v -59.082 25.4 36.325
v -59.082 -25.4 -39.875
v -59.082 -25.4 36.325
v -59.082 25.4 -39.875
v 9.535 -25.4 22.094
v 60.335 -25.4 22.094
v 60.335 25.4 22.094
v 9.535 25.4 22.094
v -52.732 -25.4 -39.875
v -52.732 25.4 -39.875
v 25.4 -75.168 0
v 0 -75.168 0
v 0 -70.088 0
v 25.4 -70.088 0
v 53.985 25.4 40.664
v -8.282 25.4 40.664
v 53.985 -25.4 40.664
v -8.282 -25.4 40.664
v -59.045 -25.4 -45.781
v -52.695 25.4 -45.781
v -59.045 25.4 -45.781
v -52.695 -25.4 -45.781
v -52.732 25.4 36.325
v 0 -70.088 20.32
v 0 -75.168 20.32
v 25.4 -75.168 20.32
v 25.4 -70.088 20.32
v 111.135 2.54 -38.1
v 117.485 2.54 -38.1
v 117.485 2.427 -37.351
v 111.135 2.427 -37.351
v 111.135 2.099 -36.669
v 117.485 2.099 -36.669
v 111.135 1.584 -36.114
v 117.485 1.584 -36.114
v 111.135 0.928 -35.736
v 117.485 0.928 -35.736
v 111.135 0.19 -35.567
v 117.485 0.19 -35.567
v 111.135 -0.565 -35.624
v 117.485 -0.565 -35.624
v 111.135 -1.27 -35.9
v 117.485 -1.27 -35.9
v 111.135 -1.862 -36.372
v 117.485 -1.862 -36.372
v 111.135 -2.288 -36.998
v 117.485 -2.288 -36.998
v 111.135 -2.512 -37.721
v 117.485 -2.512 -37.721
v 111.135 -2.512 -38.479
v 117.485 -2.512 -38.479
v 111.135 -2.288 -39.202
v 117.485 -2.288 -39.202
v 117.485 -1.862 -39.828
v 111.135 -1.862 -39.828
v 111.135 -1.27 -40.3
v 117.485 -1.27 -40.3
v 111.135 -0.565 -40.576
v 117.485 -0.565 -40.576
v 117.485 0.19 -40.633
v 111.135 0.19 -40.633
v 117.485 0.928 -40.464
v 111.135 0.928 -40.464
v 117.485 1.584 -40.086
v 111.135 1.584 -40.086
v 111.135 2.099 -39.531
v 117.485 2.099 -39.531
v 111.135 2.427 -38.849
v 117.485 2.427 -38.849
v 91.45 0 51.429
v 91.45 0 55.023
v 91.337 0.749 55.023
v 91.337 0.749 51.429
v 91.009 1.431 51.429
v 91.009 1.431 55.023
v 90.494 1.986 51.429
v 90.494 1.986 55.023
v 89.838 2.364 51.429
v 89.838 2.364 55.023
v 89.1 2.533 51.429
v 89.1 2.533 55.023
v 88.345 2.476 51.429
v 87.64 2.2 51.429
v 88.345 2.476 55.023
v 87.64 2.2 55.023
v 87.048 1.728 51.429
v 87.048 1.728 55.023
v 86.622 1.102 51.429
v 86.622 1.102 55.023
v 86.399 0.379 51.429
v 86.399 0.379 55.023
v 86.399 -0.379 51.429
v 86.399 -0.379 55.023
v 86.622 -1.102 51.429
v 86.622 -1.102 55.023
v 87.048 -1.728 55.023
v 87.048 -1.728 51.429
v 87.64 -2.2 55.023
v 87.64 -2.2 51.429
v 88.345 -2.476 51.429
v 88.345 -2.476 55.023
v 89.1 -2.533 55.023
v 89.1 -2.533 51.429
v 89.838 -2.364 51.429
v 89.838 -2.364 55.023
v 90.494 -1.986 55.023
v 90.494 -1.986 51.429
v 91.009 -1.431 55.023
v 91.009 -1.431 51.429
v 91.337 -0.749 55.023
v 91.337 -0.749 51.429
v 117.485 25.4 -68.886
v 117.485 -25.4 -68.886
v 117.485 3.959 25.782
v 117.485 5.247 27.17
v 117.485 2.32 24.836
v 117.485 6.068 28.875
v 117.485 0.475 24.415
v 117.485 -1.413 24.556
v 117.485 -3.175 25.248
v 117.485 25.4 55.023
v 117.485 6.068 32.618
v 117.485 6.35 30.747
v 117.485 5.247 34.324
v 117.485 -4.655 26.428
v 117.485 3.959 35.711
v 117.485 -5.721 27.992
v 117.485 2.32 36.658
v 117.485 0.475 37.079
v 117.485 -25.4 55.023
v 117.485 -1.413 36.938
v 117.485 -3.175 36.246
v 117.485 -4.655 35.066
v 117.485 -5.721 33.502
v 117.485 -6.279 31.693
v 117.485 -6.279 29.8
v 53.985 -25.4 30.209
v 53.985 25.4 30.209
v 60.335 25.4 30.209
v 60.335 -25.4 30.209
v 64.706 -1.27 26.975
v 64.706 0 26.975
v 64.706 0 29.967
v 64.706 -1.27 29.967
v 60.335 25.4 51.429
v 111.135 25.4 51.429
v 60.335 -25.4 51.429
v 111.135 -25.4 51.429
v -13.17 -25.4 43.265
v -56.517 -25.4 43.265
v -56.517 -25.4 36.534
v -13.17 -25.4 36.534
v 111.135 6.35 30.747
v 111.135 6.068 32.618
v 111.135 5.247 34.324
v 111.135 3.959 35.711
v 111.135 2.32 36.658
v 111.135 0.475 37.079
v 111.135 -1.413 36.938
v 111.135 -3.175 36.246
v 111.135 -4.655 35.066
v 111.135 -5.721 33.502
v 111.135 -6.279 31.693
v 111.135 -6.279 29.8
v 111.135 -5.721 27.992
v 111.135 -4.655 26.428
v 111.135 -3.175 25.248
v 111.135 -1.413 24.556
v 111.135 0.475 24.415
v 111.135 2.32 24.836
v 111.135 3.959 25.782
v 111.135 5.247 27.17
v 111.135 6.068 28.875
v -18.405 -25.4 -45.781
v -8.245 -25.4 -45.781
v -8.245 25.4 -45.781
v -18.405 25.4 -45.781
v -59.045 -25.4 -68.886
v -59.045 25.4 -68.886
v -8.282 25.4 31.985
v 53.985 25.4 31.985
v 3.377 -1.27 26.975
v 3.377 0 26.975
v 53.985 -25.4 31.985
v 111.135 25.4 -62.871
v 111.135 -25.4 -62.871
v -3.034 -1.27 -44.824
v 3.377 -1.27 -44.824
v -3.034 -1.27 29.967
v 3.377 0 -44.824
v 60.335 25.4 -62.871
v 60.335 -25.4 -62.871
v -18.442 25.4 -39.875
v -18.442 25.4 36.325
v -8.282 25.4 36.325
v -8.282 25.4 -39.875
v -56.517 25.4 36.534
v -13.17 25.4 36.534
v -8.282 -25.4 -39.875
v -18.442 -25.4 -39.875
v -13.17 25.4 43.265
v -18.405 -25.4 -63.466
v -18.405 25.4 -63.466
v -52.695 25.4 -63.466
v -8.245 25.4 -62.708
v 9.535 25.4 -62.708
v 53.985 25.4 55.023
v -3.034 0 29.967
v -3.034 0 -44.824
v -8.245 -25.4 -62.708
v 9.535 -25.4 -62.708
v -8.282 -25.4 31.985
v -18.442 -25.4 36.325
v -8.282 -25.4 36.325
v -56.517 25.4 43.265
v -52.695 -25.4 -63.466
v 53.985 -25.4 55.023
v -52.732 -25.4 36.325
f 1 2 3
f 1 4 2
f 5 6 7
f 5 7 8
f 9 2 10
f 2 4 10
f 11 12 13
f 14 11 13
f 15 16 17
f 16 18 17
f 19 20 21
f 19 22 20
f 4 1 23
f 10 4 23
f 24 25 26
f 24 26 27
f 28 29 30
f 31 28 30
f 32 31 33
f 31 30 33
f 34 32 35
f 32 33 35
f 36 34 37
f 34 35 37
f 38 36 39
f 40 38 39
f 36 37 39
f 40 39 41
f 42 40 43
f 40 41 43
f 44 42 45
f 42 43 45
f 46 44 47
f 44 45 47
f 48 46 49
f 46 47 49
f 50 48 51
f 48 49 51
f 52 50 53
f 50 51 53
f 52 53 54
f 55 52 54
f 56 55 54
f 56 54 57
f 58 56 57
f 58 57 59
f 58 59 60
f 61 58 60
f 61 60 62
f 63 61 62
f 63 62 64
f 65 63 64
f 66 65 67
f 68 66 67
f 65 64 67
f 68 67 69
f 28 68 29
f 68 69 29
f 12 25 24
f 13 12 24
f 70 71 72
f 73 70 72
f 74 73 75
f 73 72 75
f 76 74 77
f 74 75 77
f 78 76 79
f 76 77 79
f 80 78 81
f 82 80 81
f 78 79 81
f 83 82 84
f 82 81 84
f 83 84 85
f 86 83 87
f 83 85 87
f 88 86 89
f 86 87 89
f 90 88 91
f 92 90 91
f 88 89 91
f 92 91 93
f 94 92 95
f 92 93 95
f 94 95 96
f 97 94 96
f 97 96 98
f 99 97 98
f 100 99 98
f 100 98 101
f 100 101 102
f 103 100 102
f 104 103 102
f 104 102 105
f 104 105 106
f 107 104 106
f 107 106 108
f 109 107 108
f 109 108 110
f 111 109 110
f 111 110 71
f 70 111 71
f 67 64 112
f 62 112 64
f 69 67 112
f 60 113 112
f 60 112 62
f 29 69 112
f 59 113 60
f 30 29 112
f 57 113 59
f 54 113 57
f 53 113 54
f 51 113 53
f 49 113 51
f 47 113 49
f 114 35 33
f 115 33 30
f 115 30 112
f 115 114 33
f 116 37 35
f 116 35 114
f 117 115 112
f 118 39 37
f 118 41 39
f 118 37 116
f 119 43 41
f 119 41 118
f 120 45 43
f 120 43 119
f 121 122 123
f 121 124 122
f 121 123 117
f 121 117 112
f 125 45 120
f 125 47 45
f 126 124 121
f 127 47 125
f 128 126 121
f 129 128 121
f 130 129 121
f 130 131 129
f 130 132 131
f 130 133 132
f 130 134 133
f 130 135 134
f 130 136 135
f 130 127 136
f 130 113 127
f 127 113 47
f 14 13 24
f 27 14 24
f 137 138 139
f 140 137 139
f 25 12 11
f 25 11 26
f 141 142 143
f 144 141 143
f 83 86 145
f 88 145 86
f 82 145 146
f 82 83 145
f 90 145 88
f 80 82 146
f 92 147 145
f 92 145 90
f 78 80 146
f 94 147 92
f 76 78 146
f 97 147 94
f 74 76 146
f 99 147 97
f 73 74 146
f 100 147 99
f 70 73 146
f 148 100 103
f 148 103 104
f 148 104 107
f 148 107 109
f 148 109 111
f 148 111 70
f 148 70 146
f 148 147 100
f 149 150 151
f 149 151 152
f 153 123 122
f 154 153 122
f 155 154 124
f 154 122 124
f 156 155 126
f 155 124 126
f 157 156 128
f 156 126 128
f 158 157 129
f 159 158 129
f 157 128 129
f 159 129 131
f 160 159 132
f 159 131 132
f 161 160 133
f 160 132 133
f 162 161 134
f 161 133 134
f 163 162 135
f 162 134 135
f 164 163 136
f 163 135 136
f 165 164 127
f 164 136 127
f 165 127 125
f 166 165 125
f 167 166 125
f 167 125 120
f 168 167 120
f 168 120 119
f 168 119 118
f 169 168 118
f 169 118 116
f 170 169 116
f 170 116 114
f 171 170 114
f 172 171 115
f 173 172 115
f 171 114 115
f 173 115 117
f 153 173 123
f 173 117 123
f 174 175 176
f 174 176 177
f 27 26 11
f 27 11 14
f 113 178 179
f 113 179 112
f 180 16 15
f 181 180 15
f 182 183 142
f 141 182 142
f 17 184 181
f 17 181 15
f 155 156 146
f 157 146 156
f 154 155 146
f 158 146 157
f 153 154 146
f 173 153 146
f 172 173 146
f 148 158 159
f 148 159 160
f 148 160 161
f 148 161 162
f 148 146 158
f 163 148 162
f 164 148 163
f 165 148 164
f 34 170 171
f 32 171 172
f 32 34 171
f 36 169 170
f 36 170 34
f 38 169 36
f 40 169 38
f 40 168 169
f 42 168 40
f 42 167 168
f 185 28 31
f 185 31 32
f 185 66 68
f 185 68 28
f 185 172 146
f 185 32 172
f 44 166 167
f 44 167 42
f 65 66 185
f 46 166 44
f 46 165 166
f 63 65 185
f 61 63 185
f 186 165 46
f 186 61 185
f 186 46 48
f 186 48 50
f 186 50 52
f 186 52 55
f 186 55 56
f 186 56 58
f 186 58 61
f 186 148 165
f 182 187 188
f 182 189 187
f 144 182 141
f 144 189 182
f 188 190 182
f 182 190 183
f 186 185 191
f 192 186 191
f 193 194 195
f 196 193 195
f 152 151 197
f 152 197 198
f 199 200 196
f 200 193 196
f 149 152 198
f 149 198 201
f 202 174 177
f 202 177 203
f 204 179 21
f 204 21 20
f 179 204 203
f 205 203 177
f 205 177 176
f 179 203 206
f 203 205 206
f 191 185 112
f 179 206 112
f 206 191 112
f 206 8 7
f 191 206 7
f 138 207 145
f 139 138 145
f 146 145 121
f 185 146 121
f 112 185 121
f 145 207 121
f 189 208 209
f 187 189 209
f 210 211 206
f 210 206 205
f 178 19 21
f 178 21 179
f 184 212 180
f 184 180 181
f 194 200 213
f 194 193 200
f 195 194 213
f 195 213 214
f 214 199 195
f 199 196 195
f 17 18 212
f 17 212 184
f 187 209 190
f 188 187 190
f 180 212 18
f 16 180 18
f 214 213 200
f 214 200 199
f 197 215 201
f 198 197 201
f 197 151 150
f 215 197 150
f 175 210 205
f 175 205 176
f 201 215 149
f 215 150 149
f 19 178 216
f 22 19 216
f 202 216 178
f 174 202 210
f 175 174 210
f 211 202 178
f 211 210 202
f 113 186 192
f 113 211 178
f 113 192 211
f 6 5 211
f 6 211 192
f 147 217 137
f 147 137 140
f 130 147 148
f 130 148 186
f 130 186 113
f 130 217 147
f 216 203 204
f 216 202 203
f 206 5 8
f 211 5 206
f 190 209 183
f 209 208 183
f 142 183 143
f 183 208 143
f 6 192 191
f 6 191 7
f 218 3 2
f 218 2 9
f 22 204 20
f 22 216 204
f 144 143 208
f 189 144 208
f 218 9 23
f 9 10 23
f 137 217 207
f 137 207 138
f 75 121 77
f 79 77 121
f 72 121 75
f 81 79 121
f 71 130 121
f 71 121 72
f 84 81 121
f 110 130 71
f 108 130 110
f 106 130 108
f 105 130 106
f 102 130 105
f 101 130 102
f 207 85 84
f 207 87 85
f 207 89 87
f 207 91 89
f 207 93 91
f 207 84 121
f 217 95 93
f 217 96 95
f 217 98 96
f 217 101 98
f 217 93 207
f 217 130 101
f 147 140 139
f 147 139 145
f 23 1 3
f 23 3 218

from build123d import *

# Parameters (mm, degrees)
F0_W      = 6.35
F0_H      = 76.2
F0_W_2    = 10.16
F1_DEPTH  = 25.4
F2_R      = 6.35
F3_DEPTH  = 6.35
F4_R      = 2.54
F5_DEPTH  = 6.35
F6_R      = 2.54
F7_DEPTH  = 3.8128
F8_W      = 62.267351
F8_H      = 8.679109
F9_DEPTH  = 25.4
F10_W     = 43.346244
F10_H     = 6.730783
F11_DEPTH = 25.4
F12_W     = 5.08
F12_H     = 20.32
F13_DEPTH = 25.4
F15_DEPTH = 1.27


with BuildPart() as f1:
    # F0 (on Front) → F1 (new body, symmetric)
    with BuildSketch(Plane.XZ):
        with Locations((-55.907167, -1.775375)):
            Rectangle(F0_W, F0_H)
        with Locations((-13.362167, -1.775375)):
            Rectangle(F0_W_2, F0_H)
        Polygon((-52.694816, -45.781121), (-59.044816, -45.781121), (-59.044816, -68.885617), (-8.244816, -68.885617), (60.335184, -68.885617), (117.485184, -68.885617), (117.485184, 55.023091), (53.985184, 55.023091), (53.985184, 30.208889), (60.335184, 30.208889), (60.335184, 51.429289), (111.135184, 51.429289), (111.135184, 21.678317), (111.135184, -62.870711), (60.335184, -62.870711), (60.335184, 22.094239), (9.535184, 22.094239), (9.535184, -62.708311), (-8.244816, -62.708311), (-8.244816, -45.781121), (-18.404816, -45.781121), (-18.404816, -63.466042), (-52.694816, -63.466042), align=None)
    extrude(amount=F1_DEPTH, both=True)

    # F2 (on face) → F3 (cut)
    with BuildSketch(Plane.YZ.offset(117.485184)):
        with Locations((0, 30.746773)):
            Circle(F2_R)
    extrude(amount=-F3_DEPTH, mode=Mode.SUBTRACT)

    # F4 (on face) → F5 (cut)
    with BuildSketch(Plane.YZ.offset(117.485184)):
        with Locations((0, -38.1)):
            Circle(F4_R)
    extrude(amount=-F5_DEPTH, mode=Mode.SUBTRACT)

    # F6 (on face) → F7 (cut)
    with BuildSketch(Plane.XY.offset(55.023091)):
        with Locations((88.910184, 0)):
            Circle(F6_R)
    extrude(amount=-F7_DEPTH, mode=Mode.SUBTRACT)


with BuildPart() as f9:
    # F8 (on Front) → F9 (new body, symmetric)
    with BuildSketch(Plane.XZ):
        with Locations((22.851508, 36.324625)):
            Rectangle(F8_W, F8_H)
    extrude(amount=F9_DEPTH, both=True)


with BuildPart() as f11:
    # F10 (on Front) → F11 (new body, symmetric)
    with BuildSketch(Plane.XZ):
        with Locations((-34.843518, 39.899862)):
            Rectangle(F10_W, F10_H)
    extrude(amount=F11_DEPTH, both=True)


with BuildPart() as f13:
    # F12 (on Right) → F13 (new body)
    with BuildSketch(Plane.YZ):
        with Locations((-72.628401, 10.16)):
            Rectangle(F12_W, F12_H)
    extrude(amount=F13_DEPTH)


with BuildPart() as f15:
    # F14 (on Front) → F15 (new body)
    with BuildSketch(Plane.XZ):
        Polygon((-3.033889, 26.975267), (-3.033889, -44.82425), (3.376782, -44.82425), (3.376782, 26.975267), (64.705536, 26.975267), (64.705536, 29.966915), (-3.033889, 29.966915), align=None)
    extrude(amount=F15_DEPTH)


solid = Compound([f1.part, f9.part, f11.part, f13.part, f15.part])
